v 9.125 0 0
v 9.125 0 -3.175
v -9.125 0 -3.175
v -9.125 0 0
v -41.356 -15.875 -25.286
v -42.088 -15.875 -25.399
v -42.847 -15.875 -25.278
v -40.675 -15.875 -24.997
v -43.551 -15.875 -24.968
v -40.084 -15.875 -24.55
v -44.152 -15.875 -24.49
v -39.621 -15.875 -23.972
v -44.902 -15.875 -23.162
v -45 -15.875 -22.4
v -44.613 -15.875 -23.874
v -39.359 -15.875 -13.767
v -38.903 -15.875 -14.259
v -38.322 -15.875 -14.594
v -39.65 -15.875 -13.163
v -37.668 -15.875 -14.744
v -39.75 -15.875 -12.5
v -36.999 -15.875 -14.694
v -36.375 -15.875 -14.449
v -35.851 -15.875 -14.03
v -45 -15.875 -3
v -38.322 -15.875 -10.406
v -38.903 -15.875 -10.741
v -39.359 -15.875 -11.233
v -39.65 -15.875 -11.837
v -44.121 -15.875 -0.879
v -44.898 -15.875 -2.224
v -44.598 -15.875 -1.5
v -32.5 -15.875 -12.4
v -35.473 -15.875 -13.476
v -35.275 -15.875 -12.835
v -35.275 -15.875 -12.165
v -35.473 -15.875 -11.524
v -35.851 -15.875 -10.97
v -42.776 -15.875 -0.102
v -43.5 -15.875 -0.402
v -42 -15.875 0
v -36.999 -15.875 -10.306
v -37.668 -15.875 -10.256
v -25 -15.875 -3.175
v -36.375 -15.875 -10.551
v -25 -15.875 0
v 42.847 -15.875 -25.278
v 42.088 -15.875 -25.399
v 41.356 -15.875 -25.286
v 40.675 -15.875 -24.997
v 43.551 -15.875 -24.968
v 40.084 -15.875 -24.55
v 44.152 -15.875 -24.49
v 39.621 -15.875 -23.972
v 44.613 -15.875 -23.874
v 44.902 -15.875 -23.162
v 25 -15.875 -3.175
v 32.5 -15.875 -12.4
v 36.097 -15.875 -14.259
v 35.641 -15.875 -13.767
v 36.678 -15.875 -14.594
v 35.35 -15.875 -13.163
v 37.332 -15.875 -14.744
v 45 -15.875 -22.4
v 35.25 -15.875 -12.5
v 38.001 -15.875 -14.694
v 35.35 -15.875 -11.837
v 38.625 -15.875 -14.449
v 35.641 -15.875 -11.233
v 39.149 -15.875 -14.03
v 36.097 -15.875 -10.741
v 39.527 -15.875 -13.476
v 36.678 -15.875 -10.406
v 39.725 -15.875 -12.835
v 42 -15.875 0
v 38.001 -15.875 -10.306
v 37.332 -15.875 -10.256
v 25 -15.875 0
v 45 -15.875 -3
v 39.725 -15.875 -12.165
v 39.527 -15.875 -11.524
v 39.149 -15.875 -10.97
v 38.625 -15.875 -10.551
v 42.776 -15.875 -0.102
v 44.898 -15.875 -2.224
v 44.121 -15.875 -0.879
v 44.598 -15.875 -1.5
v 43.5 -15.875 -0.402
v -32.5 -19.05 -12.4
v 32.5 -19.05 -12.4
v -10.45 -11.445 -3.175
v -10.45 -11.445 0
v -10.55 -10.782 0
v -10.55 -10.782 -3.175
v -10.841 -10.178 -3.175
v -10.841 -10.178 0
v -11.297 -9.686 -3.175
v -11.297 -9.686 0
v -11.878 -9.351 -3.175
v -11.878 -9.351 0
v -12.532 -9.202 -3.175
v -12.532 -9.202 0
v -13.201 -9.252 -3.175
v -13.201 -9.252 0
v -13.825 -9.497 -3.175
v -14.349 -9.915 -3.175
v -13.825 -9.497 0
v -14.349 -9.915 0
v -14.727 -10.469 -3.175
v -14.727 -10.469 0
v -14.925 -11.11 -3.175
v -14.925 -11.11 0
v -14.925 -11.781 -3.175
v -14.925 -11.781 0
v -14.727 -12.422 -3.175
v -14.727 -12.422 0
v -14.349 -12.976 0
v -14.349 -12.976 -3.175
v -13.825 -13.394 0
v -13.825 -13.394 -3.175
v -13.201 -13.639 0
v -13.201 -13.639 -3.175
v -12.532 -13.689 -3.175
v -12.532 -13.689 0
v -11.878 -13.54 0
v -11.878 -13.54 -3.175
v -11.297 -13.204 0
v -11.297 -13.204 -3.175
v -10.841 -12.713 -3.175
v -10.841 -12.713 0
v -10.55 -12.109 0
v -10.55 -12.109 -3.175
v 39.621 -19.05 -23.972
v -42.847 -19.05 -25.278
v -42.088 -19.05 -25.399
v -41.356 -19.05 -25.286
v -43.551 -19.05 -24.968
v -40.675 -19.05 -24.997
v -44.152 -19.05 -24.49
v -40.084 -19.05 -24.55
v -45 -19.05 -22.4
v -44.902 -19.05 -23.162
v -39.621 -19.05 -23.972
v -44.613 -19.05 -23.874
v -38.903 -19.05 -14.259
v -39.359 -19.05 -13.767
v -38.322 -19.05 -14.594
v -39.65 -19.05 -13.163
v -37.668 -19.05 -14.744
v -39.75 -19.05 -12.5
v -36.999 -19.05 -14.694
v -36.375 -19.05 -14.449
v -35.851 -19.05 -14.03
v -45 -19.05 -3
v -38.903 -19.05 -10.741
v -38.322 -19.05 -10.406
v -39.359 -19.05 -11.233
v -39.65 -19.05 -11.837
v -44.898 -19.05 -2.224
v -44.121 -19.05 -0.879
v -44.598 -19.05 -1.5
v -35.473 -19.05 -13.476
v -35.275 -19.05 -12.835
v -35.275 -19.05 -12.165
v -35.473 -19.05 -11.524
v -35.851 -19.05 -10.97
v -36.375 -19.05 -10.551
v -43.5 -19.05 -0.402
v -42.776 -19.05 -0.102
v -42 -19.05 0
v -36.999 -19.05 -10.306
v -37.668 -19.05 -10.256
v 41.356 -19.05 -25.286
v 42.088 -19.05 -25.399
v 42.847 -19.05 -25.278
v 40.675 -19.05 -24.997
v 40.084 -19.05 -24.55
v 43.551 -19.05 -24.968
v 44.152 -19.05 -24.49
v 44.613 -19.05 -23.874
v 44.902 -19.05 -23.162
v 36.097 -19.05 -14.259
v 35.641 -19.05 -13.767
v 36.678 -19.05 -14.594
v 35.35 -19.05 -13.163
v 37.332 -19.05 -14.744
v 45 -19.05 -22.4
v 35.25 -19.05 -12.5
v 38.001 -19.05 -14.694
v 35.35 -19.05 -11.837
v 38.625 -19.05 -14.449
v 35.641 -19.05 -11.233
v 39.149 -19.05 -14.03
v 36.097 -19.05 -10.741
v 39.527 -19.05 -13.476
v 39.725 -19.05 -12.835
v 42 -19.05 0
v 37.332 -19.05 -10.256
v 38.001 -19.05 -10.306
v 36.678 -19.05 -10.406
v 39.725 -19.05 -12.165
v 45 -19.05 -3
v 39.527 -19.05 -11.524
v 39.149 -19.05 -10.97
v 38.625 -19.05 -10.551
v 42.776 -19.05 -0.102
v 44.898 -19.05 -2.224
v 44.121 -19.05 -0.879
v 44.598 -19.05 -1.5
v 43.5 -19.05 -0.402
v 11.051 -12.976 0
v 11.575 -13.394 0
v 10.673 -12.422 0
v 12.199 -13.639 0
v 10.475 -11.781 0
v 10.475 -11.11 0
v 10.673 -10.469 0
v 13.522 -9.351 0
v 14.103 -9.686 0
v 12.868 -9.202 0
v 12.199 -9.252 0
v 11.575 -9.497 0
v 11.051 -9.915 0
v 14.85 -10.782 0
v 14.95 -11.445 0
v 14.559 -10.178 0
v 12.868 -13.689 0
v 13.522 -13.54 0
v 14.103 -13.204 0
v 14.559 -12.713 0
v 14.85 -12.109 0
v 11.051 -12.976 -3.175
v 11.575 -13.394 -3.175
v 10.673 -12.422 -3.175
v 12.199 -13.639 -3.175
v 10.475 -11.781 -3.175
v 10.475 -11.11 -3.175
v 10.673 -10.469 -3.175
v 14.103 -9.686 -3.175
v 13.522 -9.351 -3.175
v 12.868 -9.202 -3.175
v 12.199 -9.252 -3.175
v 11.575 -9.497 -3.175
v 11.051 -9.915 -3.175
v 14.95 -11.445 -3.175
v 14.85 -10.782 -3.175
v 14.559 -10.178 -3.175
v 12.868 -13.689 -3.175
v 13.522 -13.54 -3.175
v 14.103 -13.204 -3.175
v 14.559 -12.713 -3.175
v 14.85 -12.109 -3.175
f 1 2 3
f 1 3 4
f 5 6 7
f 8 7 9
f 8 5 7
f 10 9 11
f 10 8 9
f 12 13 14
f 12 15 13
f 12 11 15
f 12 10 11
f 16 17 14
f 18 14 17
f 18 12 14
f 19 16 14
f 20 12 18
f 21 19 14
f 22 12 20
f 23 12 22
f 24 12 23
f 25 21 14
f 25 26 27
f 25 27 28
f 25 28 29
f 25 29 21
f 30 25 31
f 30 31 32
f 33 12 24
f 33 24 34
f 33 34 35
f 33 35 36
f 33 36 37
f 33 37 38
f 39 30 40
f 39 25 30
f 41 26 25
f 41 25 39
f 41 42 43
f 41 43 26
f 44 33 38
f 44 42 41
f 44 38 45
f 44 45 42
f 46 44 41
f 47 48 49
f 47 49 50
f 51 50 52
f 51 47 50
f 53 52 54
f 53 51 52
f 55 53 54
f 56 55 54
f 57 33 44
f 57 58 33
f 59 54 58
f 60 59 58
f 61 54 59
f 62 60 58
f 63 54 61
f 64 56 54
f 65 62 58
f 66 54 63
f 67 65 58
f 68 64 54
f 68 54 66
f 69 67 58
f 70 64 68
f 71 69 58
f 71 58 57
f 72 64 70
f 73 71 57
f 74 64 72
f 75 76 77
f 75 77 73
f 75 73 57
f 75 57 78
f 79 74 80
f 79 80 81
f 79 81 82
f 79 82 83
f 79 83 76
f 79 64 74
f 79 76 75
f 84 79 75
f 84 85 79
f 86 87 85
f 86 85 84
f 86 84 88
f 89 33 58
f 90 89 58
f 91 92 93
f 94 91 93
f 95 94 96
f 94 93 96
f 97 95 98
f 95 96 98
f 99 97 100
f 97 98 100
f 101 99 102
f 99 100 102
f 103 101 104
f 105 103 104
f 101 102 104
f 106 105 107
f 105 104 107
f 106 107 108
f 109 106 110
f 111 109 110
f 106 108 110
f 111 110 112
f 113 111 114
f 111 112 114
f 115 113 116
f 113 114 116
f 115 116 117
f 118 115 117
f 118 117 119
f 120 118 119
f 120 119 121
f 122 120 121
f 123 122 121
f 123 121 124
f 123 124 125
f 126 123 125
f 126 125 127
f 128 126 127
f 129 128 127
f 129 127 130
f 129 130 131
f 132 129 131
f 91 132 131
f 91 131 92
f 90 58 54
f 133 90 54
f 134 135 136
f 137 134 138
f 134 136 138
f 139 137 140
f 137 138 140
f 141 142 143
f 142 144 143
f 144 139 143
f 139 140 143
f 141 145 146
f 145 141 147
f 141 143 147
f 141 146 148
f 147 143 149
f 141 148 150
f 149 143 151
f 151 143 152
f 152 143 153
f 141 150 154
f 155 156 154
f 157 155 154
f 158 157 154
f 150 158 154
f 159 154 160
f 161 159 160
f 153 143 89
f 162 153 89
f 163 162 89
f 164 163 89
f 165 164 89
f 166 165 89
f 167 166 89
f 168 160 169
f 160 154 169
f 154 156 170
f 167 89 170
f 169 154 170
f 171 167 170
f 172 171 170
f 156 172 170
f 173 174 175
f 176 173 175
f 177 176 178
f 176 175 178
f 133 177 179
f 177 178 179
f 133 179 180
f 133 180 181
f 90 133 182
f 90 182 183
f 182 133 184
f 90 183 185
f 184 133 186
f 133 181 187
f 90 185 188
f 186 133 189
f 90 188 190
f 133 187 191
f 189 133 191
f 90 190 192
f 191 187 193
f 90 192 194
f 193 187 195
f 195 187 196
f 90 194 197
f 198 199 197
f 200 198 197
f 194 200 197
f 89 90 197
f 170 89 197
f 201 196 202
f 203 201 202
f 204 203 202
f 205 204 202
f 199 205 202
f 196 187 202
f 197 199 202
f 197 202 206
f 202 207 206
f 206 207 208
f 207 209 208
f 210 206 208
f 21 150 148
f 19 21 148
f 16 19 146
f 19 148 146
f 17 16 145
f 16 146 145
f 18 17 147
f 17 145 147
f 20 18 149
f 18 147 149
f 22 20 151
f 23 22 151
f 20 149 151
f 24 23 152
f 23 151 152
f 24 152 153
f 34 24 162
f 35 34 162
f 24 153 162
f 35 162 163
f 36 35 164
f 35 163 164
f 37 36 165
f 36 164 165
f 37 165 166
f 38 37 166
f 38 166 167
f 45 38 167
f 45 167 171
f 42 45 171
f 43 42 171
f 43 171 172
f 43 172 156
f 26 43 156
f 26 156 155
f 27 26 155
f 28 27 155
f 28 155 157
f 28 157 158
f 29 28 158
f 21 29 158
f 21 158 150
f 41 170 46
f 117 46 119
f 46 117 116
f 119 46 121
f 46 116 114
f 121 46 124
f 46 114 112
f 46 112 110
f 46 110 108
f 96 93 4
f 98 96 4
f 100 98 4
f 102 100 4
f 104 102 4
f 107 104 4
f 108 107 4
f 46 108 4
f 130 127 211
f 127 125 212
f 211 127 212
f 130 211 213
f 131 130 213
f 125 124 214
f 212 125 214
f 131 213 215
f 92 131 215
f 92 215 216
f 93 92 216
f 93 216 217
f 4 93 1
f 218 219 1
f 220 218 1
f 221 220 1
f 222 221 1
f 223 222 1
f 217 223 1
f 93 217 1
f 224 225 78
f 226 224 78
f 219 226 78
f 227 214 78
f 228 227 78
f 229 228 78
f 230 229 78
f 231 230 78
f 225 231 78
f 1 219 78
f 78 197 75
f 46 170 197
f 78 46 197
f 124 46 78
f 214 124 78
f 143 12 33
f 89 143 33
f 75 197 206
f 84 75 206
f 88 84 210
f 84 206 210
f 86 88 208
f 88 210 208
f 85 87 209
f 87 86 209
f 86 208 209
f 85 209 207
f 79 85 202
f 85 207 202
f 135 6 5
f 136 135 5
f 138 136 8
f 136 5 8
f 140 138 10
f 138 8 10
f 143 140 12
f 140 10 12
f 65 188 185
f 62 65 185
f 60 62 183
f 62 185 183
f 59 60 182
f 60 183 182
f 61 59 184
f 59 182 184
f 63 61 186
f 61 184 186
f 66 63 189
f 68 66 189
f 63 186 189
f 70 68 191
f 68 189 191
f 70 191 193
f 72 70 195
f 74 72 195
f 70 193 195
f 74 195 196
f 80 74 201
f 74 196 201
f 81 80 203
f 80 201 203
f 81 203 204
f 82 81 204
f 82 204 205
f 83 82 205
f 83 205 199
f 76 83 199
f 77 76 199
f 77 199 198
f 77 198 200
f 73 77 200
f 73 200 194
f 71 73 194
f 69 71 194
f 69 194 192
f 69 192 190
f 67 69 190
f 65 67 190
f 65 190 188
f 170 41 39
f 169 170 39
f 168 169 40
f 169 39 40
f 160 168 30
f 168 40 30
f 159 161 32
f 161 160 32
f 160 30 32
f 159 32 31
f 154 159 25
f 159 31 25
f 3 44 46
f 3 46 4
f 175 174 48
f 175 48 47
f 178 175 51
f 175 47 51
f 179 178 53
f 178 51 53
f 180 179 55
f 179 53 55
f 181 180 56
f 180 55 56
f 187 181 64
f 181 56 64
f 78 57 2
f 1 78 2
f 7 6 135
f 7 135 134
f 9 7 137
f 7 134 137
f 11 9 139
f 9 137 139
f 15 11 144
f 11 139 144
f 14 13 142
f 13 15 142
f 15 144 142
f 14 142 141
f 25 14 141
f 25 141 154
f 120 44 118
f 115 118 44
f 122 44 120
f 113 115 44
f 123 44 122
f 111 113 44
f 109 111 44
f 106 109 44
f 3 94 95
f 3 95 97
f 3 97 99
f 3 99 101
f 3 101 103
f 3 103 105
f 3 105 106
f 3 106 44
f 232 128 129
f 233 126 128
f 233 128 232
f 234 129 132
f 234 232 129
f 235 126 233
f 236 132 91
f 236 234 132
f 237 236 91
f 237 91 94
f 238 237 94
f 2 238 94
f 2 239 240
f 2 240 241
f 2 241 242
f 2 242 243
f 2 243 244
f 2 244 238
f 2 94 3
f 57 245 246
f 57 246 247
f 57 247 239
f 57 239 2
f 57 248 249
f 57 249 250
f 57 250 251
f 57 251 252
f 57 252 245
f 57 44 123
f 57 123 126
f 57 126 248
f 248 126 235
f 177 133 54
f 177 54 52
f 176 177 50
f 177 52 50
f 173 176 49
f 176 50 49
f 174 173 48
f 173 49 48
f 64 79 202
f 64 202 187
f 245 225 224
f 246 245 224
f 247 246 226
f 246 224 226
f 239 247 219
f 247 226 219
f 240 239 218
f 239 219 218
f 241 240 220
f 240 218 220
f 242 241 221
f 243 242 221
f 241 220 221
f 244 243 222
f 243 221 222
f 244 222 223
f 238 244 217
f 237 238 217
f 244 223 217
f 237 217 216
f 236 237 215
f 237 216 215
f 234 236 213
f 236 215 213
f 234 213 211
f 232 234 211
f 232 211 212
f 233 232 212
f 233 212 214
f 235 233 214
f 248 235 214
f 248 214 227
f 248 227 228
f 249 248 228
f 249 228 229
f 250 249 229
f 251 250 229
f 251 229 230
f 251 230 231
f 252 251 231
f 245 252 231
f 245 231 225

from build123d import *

# Parameters (mm, degrees)
BOSS_EXTRUDE1_DEPTH  = 25
CUT_EXTRUDE1_DEPTH   = 39.494845434
M4_CLEARANCE_HOLE1_D = 4.5
SKETCH5_W            = 25.4
SKETCH5_H            = 3.175
BOSS_EXTRUDE2_DEPTH  = 20
SKETCH6_W            = 25.4
SKETCH6_H            = 3.175
BOSS_EXTRUDE3_DEPTH  = 20
M4_CLEARANCE_HOLE2_D = 4.5
CUT_EXTRUDE2_DEPTH   = 55.05715147
FILLET1_R            = 3


with BuildPart() as part:
    # Sketch1 → Boss-Extrude1 (new, symmetric)
    with BuildSketch(Plane(origin=(0, 0, 0), x_dir=(0, 0, -1), z_dir=(1, 0, 0))):
        Polygon((0, 0), (0, -19.05), (25.4, -19.05), (25.4, -15.875), (3.175, -15.875), (3.175, 0), align=None)
    extrude(amount=BOSS_EXTRUDE1_DEPTH, both=True)

    # Sketch2 → Cut-Extrude1 (cut, through all)
    with BuildSketch(Plane(origin=(0, 0, -3.175), x_dir=(-1, 0, 0), z_dir=(0, 0, -1))):
        Polygon((-25, -15.875), (-9.125, 0), (-25, 0), align=None)
        Polygon((25, -15.875), (9.125, 0), (25, 0), align=None)
    extrude(amount=-CUT_EXTRUDE1_DEPTH, mode=Mode.SUBTRACT)

    # M4 Clearance Hole1 (through all)
    with Locations(Plane(origin=(0, 0, -3.175), x_dir=(-1, 0, 0), z_dir=(0, 0, -1))):
        with Locations((-12.7, -11.4453125), (12.7, -11.4453125)):
            Hole(M4_CLEARANCE_HOLE1_D / 2)

    # Sketch5 → Boss-Extrude2 (add)
    with BuildSketch(Plane(origin=(25, 0, 0), x_dir=(0, 0, -1), z_dir=(1, 0, 0))):
        with Locations((12.7, -17.4625)):
            Rectangle(SKETCH5_W, SKETCH5_H)
    extrude(amount=BOSS_EXTRUDE2_DEPTH)

    # Sketch6 → Boss-Extrude3 (add)
    with BuildSketch(Plane.ZY.offset(25)):
        with Locations((-12.7, -17.4625)):
            Rectangle(SKETCH6_W, SKETCH6_H)
    extrude(amount=BOSS_EXTRUDE3_DEPTH)

    # M4 Clearance Hole2 (through all)
    with Locations(Plane(origin=(0, -15.875, 0), x_dir=(1, 0, 0), z_dir=(0, 1, 0))):
        with Locations((37.5, 12.5), (-37.5, 12.5)):
            Hole(M4_CLEARANCE_HOLE2_D / 2)

    # Sketch9 → Cut-Extrude2 (cut, through all)
    with BuildSketch(Plane(origin=(0, -15.875, 0), x_dir=(1, 0, 0), z_dir=(0, 1, 0))):
        Polygon((40.5, 25.4), (-40.5, 25.4), (-32.5, 12.4), (32.5, 12.4), align=None)
    extrude(amount=-CUT_EXTRUDE2_DEPTH, mode=Mode.SUBTRACT)

    # Fillet1
    # the kernel refuses this fillet: 3 mm, written as the material it takes off along each edge
    with BuildSketch(Plane(origin=(-45, -26.55, -25.4), x_dir=(0, 0, 1), z_dir=(0, 1, 0)), Plane(origin=(45, -8.375, -25.4), x_dir=(0, 0, 1), z_dir=(0, -1, 0))) as fillet1_piece_1:
        with BuildLine():
            CenterArc((FILLET1_R, FILLET1_R), FILLET1_R, 180, 90)
            Line((0, FILLET1_R), (0, 0))
            Line((0, 0), (FILLET1_R, 0))
        make_face()
    extrude(amount=18.175, mode=Mode.SUBTRACT)
    with BuildSketch(Plane(origin=(-40.5, -11.684036045, -25.4), x_dir=(-1, 0, 0), z_dir=(0, -1, 0)), Plane(origin=(40.5, -11.684036045, -25.4), x_dir=(-0.5240974256643328, 0, 0.8516583167045451), z_dir=(0, -1, 0))) as fillet1_piece_2:
        with BuildLine():
            CenterArc((FILLET1_R * 0.558795194036, -FILLET1_R), FILLET1_R, 90, 58.392497754)
            Line((-FILLET1_R * 0.292863122668, -FILLET1_R * 0.475902574336), (0, 0))
            Line((0, 0), (FILLET1_R * 0.558795194036, 0))
        make_face()
    extrude(amount=11.556927911, mode=Mode.SUBTRACT)
    with BuildSketch(Plane(origin=(45, -26.55, 0), x_dir=(-1, 0, 0), z_dir=(0, 1, 0)), Plane(origin=(-45, -8.375, 0), x_dir=(1, 0, 0), z_dir=(0, -1, 0))) as fillet1_piece_3:
        with BuildLine():
            CenterArc((FILLET1_R, -FILLET1_R), FILLET1_R, 90, 90)
            Line((0, -FILLET1_R), (0, 0))
            Line((0, 0), (FILLET1_R, 0))
        make_face()
    extrude(amount=18.175, mode=Mode.SUBTRACT)


solid = part.part
